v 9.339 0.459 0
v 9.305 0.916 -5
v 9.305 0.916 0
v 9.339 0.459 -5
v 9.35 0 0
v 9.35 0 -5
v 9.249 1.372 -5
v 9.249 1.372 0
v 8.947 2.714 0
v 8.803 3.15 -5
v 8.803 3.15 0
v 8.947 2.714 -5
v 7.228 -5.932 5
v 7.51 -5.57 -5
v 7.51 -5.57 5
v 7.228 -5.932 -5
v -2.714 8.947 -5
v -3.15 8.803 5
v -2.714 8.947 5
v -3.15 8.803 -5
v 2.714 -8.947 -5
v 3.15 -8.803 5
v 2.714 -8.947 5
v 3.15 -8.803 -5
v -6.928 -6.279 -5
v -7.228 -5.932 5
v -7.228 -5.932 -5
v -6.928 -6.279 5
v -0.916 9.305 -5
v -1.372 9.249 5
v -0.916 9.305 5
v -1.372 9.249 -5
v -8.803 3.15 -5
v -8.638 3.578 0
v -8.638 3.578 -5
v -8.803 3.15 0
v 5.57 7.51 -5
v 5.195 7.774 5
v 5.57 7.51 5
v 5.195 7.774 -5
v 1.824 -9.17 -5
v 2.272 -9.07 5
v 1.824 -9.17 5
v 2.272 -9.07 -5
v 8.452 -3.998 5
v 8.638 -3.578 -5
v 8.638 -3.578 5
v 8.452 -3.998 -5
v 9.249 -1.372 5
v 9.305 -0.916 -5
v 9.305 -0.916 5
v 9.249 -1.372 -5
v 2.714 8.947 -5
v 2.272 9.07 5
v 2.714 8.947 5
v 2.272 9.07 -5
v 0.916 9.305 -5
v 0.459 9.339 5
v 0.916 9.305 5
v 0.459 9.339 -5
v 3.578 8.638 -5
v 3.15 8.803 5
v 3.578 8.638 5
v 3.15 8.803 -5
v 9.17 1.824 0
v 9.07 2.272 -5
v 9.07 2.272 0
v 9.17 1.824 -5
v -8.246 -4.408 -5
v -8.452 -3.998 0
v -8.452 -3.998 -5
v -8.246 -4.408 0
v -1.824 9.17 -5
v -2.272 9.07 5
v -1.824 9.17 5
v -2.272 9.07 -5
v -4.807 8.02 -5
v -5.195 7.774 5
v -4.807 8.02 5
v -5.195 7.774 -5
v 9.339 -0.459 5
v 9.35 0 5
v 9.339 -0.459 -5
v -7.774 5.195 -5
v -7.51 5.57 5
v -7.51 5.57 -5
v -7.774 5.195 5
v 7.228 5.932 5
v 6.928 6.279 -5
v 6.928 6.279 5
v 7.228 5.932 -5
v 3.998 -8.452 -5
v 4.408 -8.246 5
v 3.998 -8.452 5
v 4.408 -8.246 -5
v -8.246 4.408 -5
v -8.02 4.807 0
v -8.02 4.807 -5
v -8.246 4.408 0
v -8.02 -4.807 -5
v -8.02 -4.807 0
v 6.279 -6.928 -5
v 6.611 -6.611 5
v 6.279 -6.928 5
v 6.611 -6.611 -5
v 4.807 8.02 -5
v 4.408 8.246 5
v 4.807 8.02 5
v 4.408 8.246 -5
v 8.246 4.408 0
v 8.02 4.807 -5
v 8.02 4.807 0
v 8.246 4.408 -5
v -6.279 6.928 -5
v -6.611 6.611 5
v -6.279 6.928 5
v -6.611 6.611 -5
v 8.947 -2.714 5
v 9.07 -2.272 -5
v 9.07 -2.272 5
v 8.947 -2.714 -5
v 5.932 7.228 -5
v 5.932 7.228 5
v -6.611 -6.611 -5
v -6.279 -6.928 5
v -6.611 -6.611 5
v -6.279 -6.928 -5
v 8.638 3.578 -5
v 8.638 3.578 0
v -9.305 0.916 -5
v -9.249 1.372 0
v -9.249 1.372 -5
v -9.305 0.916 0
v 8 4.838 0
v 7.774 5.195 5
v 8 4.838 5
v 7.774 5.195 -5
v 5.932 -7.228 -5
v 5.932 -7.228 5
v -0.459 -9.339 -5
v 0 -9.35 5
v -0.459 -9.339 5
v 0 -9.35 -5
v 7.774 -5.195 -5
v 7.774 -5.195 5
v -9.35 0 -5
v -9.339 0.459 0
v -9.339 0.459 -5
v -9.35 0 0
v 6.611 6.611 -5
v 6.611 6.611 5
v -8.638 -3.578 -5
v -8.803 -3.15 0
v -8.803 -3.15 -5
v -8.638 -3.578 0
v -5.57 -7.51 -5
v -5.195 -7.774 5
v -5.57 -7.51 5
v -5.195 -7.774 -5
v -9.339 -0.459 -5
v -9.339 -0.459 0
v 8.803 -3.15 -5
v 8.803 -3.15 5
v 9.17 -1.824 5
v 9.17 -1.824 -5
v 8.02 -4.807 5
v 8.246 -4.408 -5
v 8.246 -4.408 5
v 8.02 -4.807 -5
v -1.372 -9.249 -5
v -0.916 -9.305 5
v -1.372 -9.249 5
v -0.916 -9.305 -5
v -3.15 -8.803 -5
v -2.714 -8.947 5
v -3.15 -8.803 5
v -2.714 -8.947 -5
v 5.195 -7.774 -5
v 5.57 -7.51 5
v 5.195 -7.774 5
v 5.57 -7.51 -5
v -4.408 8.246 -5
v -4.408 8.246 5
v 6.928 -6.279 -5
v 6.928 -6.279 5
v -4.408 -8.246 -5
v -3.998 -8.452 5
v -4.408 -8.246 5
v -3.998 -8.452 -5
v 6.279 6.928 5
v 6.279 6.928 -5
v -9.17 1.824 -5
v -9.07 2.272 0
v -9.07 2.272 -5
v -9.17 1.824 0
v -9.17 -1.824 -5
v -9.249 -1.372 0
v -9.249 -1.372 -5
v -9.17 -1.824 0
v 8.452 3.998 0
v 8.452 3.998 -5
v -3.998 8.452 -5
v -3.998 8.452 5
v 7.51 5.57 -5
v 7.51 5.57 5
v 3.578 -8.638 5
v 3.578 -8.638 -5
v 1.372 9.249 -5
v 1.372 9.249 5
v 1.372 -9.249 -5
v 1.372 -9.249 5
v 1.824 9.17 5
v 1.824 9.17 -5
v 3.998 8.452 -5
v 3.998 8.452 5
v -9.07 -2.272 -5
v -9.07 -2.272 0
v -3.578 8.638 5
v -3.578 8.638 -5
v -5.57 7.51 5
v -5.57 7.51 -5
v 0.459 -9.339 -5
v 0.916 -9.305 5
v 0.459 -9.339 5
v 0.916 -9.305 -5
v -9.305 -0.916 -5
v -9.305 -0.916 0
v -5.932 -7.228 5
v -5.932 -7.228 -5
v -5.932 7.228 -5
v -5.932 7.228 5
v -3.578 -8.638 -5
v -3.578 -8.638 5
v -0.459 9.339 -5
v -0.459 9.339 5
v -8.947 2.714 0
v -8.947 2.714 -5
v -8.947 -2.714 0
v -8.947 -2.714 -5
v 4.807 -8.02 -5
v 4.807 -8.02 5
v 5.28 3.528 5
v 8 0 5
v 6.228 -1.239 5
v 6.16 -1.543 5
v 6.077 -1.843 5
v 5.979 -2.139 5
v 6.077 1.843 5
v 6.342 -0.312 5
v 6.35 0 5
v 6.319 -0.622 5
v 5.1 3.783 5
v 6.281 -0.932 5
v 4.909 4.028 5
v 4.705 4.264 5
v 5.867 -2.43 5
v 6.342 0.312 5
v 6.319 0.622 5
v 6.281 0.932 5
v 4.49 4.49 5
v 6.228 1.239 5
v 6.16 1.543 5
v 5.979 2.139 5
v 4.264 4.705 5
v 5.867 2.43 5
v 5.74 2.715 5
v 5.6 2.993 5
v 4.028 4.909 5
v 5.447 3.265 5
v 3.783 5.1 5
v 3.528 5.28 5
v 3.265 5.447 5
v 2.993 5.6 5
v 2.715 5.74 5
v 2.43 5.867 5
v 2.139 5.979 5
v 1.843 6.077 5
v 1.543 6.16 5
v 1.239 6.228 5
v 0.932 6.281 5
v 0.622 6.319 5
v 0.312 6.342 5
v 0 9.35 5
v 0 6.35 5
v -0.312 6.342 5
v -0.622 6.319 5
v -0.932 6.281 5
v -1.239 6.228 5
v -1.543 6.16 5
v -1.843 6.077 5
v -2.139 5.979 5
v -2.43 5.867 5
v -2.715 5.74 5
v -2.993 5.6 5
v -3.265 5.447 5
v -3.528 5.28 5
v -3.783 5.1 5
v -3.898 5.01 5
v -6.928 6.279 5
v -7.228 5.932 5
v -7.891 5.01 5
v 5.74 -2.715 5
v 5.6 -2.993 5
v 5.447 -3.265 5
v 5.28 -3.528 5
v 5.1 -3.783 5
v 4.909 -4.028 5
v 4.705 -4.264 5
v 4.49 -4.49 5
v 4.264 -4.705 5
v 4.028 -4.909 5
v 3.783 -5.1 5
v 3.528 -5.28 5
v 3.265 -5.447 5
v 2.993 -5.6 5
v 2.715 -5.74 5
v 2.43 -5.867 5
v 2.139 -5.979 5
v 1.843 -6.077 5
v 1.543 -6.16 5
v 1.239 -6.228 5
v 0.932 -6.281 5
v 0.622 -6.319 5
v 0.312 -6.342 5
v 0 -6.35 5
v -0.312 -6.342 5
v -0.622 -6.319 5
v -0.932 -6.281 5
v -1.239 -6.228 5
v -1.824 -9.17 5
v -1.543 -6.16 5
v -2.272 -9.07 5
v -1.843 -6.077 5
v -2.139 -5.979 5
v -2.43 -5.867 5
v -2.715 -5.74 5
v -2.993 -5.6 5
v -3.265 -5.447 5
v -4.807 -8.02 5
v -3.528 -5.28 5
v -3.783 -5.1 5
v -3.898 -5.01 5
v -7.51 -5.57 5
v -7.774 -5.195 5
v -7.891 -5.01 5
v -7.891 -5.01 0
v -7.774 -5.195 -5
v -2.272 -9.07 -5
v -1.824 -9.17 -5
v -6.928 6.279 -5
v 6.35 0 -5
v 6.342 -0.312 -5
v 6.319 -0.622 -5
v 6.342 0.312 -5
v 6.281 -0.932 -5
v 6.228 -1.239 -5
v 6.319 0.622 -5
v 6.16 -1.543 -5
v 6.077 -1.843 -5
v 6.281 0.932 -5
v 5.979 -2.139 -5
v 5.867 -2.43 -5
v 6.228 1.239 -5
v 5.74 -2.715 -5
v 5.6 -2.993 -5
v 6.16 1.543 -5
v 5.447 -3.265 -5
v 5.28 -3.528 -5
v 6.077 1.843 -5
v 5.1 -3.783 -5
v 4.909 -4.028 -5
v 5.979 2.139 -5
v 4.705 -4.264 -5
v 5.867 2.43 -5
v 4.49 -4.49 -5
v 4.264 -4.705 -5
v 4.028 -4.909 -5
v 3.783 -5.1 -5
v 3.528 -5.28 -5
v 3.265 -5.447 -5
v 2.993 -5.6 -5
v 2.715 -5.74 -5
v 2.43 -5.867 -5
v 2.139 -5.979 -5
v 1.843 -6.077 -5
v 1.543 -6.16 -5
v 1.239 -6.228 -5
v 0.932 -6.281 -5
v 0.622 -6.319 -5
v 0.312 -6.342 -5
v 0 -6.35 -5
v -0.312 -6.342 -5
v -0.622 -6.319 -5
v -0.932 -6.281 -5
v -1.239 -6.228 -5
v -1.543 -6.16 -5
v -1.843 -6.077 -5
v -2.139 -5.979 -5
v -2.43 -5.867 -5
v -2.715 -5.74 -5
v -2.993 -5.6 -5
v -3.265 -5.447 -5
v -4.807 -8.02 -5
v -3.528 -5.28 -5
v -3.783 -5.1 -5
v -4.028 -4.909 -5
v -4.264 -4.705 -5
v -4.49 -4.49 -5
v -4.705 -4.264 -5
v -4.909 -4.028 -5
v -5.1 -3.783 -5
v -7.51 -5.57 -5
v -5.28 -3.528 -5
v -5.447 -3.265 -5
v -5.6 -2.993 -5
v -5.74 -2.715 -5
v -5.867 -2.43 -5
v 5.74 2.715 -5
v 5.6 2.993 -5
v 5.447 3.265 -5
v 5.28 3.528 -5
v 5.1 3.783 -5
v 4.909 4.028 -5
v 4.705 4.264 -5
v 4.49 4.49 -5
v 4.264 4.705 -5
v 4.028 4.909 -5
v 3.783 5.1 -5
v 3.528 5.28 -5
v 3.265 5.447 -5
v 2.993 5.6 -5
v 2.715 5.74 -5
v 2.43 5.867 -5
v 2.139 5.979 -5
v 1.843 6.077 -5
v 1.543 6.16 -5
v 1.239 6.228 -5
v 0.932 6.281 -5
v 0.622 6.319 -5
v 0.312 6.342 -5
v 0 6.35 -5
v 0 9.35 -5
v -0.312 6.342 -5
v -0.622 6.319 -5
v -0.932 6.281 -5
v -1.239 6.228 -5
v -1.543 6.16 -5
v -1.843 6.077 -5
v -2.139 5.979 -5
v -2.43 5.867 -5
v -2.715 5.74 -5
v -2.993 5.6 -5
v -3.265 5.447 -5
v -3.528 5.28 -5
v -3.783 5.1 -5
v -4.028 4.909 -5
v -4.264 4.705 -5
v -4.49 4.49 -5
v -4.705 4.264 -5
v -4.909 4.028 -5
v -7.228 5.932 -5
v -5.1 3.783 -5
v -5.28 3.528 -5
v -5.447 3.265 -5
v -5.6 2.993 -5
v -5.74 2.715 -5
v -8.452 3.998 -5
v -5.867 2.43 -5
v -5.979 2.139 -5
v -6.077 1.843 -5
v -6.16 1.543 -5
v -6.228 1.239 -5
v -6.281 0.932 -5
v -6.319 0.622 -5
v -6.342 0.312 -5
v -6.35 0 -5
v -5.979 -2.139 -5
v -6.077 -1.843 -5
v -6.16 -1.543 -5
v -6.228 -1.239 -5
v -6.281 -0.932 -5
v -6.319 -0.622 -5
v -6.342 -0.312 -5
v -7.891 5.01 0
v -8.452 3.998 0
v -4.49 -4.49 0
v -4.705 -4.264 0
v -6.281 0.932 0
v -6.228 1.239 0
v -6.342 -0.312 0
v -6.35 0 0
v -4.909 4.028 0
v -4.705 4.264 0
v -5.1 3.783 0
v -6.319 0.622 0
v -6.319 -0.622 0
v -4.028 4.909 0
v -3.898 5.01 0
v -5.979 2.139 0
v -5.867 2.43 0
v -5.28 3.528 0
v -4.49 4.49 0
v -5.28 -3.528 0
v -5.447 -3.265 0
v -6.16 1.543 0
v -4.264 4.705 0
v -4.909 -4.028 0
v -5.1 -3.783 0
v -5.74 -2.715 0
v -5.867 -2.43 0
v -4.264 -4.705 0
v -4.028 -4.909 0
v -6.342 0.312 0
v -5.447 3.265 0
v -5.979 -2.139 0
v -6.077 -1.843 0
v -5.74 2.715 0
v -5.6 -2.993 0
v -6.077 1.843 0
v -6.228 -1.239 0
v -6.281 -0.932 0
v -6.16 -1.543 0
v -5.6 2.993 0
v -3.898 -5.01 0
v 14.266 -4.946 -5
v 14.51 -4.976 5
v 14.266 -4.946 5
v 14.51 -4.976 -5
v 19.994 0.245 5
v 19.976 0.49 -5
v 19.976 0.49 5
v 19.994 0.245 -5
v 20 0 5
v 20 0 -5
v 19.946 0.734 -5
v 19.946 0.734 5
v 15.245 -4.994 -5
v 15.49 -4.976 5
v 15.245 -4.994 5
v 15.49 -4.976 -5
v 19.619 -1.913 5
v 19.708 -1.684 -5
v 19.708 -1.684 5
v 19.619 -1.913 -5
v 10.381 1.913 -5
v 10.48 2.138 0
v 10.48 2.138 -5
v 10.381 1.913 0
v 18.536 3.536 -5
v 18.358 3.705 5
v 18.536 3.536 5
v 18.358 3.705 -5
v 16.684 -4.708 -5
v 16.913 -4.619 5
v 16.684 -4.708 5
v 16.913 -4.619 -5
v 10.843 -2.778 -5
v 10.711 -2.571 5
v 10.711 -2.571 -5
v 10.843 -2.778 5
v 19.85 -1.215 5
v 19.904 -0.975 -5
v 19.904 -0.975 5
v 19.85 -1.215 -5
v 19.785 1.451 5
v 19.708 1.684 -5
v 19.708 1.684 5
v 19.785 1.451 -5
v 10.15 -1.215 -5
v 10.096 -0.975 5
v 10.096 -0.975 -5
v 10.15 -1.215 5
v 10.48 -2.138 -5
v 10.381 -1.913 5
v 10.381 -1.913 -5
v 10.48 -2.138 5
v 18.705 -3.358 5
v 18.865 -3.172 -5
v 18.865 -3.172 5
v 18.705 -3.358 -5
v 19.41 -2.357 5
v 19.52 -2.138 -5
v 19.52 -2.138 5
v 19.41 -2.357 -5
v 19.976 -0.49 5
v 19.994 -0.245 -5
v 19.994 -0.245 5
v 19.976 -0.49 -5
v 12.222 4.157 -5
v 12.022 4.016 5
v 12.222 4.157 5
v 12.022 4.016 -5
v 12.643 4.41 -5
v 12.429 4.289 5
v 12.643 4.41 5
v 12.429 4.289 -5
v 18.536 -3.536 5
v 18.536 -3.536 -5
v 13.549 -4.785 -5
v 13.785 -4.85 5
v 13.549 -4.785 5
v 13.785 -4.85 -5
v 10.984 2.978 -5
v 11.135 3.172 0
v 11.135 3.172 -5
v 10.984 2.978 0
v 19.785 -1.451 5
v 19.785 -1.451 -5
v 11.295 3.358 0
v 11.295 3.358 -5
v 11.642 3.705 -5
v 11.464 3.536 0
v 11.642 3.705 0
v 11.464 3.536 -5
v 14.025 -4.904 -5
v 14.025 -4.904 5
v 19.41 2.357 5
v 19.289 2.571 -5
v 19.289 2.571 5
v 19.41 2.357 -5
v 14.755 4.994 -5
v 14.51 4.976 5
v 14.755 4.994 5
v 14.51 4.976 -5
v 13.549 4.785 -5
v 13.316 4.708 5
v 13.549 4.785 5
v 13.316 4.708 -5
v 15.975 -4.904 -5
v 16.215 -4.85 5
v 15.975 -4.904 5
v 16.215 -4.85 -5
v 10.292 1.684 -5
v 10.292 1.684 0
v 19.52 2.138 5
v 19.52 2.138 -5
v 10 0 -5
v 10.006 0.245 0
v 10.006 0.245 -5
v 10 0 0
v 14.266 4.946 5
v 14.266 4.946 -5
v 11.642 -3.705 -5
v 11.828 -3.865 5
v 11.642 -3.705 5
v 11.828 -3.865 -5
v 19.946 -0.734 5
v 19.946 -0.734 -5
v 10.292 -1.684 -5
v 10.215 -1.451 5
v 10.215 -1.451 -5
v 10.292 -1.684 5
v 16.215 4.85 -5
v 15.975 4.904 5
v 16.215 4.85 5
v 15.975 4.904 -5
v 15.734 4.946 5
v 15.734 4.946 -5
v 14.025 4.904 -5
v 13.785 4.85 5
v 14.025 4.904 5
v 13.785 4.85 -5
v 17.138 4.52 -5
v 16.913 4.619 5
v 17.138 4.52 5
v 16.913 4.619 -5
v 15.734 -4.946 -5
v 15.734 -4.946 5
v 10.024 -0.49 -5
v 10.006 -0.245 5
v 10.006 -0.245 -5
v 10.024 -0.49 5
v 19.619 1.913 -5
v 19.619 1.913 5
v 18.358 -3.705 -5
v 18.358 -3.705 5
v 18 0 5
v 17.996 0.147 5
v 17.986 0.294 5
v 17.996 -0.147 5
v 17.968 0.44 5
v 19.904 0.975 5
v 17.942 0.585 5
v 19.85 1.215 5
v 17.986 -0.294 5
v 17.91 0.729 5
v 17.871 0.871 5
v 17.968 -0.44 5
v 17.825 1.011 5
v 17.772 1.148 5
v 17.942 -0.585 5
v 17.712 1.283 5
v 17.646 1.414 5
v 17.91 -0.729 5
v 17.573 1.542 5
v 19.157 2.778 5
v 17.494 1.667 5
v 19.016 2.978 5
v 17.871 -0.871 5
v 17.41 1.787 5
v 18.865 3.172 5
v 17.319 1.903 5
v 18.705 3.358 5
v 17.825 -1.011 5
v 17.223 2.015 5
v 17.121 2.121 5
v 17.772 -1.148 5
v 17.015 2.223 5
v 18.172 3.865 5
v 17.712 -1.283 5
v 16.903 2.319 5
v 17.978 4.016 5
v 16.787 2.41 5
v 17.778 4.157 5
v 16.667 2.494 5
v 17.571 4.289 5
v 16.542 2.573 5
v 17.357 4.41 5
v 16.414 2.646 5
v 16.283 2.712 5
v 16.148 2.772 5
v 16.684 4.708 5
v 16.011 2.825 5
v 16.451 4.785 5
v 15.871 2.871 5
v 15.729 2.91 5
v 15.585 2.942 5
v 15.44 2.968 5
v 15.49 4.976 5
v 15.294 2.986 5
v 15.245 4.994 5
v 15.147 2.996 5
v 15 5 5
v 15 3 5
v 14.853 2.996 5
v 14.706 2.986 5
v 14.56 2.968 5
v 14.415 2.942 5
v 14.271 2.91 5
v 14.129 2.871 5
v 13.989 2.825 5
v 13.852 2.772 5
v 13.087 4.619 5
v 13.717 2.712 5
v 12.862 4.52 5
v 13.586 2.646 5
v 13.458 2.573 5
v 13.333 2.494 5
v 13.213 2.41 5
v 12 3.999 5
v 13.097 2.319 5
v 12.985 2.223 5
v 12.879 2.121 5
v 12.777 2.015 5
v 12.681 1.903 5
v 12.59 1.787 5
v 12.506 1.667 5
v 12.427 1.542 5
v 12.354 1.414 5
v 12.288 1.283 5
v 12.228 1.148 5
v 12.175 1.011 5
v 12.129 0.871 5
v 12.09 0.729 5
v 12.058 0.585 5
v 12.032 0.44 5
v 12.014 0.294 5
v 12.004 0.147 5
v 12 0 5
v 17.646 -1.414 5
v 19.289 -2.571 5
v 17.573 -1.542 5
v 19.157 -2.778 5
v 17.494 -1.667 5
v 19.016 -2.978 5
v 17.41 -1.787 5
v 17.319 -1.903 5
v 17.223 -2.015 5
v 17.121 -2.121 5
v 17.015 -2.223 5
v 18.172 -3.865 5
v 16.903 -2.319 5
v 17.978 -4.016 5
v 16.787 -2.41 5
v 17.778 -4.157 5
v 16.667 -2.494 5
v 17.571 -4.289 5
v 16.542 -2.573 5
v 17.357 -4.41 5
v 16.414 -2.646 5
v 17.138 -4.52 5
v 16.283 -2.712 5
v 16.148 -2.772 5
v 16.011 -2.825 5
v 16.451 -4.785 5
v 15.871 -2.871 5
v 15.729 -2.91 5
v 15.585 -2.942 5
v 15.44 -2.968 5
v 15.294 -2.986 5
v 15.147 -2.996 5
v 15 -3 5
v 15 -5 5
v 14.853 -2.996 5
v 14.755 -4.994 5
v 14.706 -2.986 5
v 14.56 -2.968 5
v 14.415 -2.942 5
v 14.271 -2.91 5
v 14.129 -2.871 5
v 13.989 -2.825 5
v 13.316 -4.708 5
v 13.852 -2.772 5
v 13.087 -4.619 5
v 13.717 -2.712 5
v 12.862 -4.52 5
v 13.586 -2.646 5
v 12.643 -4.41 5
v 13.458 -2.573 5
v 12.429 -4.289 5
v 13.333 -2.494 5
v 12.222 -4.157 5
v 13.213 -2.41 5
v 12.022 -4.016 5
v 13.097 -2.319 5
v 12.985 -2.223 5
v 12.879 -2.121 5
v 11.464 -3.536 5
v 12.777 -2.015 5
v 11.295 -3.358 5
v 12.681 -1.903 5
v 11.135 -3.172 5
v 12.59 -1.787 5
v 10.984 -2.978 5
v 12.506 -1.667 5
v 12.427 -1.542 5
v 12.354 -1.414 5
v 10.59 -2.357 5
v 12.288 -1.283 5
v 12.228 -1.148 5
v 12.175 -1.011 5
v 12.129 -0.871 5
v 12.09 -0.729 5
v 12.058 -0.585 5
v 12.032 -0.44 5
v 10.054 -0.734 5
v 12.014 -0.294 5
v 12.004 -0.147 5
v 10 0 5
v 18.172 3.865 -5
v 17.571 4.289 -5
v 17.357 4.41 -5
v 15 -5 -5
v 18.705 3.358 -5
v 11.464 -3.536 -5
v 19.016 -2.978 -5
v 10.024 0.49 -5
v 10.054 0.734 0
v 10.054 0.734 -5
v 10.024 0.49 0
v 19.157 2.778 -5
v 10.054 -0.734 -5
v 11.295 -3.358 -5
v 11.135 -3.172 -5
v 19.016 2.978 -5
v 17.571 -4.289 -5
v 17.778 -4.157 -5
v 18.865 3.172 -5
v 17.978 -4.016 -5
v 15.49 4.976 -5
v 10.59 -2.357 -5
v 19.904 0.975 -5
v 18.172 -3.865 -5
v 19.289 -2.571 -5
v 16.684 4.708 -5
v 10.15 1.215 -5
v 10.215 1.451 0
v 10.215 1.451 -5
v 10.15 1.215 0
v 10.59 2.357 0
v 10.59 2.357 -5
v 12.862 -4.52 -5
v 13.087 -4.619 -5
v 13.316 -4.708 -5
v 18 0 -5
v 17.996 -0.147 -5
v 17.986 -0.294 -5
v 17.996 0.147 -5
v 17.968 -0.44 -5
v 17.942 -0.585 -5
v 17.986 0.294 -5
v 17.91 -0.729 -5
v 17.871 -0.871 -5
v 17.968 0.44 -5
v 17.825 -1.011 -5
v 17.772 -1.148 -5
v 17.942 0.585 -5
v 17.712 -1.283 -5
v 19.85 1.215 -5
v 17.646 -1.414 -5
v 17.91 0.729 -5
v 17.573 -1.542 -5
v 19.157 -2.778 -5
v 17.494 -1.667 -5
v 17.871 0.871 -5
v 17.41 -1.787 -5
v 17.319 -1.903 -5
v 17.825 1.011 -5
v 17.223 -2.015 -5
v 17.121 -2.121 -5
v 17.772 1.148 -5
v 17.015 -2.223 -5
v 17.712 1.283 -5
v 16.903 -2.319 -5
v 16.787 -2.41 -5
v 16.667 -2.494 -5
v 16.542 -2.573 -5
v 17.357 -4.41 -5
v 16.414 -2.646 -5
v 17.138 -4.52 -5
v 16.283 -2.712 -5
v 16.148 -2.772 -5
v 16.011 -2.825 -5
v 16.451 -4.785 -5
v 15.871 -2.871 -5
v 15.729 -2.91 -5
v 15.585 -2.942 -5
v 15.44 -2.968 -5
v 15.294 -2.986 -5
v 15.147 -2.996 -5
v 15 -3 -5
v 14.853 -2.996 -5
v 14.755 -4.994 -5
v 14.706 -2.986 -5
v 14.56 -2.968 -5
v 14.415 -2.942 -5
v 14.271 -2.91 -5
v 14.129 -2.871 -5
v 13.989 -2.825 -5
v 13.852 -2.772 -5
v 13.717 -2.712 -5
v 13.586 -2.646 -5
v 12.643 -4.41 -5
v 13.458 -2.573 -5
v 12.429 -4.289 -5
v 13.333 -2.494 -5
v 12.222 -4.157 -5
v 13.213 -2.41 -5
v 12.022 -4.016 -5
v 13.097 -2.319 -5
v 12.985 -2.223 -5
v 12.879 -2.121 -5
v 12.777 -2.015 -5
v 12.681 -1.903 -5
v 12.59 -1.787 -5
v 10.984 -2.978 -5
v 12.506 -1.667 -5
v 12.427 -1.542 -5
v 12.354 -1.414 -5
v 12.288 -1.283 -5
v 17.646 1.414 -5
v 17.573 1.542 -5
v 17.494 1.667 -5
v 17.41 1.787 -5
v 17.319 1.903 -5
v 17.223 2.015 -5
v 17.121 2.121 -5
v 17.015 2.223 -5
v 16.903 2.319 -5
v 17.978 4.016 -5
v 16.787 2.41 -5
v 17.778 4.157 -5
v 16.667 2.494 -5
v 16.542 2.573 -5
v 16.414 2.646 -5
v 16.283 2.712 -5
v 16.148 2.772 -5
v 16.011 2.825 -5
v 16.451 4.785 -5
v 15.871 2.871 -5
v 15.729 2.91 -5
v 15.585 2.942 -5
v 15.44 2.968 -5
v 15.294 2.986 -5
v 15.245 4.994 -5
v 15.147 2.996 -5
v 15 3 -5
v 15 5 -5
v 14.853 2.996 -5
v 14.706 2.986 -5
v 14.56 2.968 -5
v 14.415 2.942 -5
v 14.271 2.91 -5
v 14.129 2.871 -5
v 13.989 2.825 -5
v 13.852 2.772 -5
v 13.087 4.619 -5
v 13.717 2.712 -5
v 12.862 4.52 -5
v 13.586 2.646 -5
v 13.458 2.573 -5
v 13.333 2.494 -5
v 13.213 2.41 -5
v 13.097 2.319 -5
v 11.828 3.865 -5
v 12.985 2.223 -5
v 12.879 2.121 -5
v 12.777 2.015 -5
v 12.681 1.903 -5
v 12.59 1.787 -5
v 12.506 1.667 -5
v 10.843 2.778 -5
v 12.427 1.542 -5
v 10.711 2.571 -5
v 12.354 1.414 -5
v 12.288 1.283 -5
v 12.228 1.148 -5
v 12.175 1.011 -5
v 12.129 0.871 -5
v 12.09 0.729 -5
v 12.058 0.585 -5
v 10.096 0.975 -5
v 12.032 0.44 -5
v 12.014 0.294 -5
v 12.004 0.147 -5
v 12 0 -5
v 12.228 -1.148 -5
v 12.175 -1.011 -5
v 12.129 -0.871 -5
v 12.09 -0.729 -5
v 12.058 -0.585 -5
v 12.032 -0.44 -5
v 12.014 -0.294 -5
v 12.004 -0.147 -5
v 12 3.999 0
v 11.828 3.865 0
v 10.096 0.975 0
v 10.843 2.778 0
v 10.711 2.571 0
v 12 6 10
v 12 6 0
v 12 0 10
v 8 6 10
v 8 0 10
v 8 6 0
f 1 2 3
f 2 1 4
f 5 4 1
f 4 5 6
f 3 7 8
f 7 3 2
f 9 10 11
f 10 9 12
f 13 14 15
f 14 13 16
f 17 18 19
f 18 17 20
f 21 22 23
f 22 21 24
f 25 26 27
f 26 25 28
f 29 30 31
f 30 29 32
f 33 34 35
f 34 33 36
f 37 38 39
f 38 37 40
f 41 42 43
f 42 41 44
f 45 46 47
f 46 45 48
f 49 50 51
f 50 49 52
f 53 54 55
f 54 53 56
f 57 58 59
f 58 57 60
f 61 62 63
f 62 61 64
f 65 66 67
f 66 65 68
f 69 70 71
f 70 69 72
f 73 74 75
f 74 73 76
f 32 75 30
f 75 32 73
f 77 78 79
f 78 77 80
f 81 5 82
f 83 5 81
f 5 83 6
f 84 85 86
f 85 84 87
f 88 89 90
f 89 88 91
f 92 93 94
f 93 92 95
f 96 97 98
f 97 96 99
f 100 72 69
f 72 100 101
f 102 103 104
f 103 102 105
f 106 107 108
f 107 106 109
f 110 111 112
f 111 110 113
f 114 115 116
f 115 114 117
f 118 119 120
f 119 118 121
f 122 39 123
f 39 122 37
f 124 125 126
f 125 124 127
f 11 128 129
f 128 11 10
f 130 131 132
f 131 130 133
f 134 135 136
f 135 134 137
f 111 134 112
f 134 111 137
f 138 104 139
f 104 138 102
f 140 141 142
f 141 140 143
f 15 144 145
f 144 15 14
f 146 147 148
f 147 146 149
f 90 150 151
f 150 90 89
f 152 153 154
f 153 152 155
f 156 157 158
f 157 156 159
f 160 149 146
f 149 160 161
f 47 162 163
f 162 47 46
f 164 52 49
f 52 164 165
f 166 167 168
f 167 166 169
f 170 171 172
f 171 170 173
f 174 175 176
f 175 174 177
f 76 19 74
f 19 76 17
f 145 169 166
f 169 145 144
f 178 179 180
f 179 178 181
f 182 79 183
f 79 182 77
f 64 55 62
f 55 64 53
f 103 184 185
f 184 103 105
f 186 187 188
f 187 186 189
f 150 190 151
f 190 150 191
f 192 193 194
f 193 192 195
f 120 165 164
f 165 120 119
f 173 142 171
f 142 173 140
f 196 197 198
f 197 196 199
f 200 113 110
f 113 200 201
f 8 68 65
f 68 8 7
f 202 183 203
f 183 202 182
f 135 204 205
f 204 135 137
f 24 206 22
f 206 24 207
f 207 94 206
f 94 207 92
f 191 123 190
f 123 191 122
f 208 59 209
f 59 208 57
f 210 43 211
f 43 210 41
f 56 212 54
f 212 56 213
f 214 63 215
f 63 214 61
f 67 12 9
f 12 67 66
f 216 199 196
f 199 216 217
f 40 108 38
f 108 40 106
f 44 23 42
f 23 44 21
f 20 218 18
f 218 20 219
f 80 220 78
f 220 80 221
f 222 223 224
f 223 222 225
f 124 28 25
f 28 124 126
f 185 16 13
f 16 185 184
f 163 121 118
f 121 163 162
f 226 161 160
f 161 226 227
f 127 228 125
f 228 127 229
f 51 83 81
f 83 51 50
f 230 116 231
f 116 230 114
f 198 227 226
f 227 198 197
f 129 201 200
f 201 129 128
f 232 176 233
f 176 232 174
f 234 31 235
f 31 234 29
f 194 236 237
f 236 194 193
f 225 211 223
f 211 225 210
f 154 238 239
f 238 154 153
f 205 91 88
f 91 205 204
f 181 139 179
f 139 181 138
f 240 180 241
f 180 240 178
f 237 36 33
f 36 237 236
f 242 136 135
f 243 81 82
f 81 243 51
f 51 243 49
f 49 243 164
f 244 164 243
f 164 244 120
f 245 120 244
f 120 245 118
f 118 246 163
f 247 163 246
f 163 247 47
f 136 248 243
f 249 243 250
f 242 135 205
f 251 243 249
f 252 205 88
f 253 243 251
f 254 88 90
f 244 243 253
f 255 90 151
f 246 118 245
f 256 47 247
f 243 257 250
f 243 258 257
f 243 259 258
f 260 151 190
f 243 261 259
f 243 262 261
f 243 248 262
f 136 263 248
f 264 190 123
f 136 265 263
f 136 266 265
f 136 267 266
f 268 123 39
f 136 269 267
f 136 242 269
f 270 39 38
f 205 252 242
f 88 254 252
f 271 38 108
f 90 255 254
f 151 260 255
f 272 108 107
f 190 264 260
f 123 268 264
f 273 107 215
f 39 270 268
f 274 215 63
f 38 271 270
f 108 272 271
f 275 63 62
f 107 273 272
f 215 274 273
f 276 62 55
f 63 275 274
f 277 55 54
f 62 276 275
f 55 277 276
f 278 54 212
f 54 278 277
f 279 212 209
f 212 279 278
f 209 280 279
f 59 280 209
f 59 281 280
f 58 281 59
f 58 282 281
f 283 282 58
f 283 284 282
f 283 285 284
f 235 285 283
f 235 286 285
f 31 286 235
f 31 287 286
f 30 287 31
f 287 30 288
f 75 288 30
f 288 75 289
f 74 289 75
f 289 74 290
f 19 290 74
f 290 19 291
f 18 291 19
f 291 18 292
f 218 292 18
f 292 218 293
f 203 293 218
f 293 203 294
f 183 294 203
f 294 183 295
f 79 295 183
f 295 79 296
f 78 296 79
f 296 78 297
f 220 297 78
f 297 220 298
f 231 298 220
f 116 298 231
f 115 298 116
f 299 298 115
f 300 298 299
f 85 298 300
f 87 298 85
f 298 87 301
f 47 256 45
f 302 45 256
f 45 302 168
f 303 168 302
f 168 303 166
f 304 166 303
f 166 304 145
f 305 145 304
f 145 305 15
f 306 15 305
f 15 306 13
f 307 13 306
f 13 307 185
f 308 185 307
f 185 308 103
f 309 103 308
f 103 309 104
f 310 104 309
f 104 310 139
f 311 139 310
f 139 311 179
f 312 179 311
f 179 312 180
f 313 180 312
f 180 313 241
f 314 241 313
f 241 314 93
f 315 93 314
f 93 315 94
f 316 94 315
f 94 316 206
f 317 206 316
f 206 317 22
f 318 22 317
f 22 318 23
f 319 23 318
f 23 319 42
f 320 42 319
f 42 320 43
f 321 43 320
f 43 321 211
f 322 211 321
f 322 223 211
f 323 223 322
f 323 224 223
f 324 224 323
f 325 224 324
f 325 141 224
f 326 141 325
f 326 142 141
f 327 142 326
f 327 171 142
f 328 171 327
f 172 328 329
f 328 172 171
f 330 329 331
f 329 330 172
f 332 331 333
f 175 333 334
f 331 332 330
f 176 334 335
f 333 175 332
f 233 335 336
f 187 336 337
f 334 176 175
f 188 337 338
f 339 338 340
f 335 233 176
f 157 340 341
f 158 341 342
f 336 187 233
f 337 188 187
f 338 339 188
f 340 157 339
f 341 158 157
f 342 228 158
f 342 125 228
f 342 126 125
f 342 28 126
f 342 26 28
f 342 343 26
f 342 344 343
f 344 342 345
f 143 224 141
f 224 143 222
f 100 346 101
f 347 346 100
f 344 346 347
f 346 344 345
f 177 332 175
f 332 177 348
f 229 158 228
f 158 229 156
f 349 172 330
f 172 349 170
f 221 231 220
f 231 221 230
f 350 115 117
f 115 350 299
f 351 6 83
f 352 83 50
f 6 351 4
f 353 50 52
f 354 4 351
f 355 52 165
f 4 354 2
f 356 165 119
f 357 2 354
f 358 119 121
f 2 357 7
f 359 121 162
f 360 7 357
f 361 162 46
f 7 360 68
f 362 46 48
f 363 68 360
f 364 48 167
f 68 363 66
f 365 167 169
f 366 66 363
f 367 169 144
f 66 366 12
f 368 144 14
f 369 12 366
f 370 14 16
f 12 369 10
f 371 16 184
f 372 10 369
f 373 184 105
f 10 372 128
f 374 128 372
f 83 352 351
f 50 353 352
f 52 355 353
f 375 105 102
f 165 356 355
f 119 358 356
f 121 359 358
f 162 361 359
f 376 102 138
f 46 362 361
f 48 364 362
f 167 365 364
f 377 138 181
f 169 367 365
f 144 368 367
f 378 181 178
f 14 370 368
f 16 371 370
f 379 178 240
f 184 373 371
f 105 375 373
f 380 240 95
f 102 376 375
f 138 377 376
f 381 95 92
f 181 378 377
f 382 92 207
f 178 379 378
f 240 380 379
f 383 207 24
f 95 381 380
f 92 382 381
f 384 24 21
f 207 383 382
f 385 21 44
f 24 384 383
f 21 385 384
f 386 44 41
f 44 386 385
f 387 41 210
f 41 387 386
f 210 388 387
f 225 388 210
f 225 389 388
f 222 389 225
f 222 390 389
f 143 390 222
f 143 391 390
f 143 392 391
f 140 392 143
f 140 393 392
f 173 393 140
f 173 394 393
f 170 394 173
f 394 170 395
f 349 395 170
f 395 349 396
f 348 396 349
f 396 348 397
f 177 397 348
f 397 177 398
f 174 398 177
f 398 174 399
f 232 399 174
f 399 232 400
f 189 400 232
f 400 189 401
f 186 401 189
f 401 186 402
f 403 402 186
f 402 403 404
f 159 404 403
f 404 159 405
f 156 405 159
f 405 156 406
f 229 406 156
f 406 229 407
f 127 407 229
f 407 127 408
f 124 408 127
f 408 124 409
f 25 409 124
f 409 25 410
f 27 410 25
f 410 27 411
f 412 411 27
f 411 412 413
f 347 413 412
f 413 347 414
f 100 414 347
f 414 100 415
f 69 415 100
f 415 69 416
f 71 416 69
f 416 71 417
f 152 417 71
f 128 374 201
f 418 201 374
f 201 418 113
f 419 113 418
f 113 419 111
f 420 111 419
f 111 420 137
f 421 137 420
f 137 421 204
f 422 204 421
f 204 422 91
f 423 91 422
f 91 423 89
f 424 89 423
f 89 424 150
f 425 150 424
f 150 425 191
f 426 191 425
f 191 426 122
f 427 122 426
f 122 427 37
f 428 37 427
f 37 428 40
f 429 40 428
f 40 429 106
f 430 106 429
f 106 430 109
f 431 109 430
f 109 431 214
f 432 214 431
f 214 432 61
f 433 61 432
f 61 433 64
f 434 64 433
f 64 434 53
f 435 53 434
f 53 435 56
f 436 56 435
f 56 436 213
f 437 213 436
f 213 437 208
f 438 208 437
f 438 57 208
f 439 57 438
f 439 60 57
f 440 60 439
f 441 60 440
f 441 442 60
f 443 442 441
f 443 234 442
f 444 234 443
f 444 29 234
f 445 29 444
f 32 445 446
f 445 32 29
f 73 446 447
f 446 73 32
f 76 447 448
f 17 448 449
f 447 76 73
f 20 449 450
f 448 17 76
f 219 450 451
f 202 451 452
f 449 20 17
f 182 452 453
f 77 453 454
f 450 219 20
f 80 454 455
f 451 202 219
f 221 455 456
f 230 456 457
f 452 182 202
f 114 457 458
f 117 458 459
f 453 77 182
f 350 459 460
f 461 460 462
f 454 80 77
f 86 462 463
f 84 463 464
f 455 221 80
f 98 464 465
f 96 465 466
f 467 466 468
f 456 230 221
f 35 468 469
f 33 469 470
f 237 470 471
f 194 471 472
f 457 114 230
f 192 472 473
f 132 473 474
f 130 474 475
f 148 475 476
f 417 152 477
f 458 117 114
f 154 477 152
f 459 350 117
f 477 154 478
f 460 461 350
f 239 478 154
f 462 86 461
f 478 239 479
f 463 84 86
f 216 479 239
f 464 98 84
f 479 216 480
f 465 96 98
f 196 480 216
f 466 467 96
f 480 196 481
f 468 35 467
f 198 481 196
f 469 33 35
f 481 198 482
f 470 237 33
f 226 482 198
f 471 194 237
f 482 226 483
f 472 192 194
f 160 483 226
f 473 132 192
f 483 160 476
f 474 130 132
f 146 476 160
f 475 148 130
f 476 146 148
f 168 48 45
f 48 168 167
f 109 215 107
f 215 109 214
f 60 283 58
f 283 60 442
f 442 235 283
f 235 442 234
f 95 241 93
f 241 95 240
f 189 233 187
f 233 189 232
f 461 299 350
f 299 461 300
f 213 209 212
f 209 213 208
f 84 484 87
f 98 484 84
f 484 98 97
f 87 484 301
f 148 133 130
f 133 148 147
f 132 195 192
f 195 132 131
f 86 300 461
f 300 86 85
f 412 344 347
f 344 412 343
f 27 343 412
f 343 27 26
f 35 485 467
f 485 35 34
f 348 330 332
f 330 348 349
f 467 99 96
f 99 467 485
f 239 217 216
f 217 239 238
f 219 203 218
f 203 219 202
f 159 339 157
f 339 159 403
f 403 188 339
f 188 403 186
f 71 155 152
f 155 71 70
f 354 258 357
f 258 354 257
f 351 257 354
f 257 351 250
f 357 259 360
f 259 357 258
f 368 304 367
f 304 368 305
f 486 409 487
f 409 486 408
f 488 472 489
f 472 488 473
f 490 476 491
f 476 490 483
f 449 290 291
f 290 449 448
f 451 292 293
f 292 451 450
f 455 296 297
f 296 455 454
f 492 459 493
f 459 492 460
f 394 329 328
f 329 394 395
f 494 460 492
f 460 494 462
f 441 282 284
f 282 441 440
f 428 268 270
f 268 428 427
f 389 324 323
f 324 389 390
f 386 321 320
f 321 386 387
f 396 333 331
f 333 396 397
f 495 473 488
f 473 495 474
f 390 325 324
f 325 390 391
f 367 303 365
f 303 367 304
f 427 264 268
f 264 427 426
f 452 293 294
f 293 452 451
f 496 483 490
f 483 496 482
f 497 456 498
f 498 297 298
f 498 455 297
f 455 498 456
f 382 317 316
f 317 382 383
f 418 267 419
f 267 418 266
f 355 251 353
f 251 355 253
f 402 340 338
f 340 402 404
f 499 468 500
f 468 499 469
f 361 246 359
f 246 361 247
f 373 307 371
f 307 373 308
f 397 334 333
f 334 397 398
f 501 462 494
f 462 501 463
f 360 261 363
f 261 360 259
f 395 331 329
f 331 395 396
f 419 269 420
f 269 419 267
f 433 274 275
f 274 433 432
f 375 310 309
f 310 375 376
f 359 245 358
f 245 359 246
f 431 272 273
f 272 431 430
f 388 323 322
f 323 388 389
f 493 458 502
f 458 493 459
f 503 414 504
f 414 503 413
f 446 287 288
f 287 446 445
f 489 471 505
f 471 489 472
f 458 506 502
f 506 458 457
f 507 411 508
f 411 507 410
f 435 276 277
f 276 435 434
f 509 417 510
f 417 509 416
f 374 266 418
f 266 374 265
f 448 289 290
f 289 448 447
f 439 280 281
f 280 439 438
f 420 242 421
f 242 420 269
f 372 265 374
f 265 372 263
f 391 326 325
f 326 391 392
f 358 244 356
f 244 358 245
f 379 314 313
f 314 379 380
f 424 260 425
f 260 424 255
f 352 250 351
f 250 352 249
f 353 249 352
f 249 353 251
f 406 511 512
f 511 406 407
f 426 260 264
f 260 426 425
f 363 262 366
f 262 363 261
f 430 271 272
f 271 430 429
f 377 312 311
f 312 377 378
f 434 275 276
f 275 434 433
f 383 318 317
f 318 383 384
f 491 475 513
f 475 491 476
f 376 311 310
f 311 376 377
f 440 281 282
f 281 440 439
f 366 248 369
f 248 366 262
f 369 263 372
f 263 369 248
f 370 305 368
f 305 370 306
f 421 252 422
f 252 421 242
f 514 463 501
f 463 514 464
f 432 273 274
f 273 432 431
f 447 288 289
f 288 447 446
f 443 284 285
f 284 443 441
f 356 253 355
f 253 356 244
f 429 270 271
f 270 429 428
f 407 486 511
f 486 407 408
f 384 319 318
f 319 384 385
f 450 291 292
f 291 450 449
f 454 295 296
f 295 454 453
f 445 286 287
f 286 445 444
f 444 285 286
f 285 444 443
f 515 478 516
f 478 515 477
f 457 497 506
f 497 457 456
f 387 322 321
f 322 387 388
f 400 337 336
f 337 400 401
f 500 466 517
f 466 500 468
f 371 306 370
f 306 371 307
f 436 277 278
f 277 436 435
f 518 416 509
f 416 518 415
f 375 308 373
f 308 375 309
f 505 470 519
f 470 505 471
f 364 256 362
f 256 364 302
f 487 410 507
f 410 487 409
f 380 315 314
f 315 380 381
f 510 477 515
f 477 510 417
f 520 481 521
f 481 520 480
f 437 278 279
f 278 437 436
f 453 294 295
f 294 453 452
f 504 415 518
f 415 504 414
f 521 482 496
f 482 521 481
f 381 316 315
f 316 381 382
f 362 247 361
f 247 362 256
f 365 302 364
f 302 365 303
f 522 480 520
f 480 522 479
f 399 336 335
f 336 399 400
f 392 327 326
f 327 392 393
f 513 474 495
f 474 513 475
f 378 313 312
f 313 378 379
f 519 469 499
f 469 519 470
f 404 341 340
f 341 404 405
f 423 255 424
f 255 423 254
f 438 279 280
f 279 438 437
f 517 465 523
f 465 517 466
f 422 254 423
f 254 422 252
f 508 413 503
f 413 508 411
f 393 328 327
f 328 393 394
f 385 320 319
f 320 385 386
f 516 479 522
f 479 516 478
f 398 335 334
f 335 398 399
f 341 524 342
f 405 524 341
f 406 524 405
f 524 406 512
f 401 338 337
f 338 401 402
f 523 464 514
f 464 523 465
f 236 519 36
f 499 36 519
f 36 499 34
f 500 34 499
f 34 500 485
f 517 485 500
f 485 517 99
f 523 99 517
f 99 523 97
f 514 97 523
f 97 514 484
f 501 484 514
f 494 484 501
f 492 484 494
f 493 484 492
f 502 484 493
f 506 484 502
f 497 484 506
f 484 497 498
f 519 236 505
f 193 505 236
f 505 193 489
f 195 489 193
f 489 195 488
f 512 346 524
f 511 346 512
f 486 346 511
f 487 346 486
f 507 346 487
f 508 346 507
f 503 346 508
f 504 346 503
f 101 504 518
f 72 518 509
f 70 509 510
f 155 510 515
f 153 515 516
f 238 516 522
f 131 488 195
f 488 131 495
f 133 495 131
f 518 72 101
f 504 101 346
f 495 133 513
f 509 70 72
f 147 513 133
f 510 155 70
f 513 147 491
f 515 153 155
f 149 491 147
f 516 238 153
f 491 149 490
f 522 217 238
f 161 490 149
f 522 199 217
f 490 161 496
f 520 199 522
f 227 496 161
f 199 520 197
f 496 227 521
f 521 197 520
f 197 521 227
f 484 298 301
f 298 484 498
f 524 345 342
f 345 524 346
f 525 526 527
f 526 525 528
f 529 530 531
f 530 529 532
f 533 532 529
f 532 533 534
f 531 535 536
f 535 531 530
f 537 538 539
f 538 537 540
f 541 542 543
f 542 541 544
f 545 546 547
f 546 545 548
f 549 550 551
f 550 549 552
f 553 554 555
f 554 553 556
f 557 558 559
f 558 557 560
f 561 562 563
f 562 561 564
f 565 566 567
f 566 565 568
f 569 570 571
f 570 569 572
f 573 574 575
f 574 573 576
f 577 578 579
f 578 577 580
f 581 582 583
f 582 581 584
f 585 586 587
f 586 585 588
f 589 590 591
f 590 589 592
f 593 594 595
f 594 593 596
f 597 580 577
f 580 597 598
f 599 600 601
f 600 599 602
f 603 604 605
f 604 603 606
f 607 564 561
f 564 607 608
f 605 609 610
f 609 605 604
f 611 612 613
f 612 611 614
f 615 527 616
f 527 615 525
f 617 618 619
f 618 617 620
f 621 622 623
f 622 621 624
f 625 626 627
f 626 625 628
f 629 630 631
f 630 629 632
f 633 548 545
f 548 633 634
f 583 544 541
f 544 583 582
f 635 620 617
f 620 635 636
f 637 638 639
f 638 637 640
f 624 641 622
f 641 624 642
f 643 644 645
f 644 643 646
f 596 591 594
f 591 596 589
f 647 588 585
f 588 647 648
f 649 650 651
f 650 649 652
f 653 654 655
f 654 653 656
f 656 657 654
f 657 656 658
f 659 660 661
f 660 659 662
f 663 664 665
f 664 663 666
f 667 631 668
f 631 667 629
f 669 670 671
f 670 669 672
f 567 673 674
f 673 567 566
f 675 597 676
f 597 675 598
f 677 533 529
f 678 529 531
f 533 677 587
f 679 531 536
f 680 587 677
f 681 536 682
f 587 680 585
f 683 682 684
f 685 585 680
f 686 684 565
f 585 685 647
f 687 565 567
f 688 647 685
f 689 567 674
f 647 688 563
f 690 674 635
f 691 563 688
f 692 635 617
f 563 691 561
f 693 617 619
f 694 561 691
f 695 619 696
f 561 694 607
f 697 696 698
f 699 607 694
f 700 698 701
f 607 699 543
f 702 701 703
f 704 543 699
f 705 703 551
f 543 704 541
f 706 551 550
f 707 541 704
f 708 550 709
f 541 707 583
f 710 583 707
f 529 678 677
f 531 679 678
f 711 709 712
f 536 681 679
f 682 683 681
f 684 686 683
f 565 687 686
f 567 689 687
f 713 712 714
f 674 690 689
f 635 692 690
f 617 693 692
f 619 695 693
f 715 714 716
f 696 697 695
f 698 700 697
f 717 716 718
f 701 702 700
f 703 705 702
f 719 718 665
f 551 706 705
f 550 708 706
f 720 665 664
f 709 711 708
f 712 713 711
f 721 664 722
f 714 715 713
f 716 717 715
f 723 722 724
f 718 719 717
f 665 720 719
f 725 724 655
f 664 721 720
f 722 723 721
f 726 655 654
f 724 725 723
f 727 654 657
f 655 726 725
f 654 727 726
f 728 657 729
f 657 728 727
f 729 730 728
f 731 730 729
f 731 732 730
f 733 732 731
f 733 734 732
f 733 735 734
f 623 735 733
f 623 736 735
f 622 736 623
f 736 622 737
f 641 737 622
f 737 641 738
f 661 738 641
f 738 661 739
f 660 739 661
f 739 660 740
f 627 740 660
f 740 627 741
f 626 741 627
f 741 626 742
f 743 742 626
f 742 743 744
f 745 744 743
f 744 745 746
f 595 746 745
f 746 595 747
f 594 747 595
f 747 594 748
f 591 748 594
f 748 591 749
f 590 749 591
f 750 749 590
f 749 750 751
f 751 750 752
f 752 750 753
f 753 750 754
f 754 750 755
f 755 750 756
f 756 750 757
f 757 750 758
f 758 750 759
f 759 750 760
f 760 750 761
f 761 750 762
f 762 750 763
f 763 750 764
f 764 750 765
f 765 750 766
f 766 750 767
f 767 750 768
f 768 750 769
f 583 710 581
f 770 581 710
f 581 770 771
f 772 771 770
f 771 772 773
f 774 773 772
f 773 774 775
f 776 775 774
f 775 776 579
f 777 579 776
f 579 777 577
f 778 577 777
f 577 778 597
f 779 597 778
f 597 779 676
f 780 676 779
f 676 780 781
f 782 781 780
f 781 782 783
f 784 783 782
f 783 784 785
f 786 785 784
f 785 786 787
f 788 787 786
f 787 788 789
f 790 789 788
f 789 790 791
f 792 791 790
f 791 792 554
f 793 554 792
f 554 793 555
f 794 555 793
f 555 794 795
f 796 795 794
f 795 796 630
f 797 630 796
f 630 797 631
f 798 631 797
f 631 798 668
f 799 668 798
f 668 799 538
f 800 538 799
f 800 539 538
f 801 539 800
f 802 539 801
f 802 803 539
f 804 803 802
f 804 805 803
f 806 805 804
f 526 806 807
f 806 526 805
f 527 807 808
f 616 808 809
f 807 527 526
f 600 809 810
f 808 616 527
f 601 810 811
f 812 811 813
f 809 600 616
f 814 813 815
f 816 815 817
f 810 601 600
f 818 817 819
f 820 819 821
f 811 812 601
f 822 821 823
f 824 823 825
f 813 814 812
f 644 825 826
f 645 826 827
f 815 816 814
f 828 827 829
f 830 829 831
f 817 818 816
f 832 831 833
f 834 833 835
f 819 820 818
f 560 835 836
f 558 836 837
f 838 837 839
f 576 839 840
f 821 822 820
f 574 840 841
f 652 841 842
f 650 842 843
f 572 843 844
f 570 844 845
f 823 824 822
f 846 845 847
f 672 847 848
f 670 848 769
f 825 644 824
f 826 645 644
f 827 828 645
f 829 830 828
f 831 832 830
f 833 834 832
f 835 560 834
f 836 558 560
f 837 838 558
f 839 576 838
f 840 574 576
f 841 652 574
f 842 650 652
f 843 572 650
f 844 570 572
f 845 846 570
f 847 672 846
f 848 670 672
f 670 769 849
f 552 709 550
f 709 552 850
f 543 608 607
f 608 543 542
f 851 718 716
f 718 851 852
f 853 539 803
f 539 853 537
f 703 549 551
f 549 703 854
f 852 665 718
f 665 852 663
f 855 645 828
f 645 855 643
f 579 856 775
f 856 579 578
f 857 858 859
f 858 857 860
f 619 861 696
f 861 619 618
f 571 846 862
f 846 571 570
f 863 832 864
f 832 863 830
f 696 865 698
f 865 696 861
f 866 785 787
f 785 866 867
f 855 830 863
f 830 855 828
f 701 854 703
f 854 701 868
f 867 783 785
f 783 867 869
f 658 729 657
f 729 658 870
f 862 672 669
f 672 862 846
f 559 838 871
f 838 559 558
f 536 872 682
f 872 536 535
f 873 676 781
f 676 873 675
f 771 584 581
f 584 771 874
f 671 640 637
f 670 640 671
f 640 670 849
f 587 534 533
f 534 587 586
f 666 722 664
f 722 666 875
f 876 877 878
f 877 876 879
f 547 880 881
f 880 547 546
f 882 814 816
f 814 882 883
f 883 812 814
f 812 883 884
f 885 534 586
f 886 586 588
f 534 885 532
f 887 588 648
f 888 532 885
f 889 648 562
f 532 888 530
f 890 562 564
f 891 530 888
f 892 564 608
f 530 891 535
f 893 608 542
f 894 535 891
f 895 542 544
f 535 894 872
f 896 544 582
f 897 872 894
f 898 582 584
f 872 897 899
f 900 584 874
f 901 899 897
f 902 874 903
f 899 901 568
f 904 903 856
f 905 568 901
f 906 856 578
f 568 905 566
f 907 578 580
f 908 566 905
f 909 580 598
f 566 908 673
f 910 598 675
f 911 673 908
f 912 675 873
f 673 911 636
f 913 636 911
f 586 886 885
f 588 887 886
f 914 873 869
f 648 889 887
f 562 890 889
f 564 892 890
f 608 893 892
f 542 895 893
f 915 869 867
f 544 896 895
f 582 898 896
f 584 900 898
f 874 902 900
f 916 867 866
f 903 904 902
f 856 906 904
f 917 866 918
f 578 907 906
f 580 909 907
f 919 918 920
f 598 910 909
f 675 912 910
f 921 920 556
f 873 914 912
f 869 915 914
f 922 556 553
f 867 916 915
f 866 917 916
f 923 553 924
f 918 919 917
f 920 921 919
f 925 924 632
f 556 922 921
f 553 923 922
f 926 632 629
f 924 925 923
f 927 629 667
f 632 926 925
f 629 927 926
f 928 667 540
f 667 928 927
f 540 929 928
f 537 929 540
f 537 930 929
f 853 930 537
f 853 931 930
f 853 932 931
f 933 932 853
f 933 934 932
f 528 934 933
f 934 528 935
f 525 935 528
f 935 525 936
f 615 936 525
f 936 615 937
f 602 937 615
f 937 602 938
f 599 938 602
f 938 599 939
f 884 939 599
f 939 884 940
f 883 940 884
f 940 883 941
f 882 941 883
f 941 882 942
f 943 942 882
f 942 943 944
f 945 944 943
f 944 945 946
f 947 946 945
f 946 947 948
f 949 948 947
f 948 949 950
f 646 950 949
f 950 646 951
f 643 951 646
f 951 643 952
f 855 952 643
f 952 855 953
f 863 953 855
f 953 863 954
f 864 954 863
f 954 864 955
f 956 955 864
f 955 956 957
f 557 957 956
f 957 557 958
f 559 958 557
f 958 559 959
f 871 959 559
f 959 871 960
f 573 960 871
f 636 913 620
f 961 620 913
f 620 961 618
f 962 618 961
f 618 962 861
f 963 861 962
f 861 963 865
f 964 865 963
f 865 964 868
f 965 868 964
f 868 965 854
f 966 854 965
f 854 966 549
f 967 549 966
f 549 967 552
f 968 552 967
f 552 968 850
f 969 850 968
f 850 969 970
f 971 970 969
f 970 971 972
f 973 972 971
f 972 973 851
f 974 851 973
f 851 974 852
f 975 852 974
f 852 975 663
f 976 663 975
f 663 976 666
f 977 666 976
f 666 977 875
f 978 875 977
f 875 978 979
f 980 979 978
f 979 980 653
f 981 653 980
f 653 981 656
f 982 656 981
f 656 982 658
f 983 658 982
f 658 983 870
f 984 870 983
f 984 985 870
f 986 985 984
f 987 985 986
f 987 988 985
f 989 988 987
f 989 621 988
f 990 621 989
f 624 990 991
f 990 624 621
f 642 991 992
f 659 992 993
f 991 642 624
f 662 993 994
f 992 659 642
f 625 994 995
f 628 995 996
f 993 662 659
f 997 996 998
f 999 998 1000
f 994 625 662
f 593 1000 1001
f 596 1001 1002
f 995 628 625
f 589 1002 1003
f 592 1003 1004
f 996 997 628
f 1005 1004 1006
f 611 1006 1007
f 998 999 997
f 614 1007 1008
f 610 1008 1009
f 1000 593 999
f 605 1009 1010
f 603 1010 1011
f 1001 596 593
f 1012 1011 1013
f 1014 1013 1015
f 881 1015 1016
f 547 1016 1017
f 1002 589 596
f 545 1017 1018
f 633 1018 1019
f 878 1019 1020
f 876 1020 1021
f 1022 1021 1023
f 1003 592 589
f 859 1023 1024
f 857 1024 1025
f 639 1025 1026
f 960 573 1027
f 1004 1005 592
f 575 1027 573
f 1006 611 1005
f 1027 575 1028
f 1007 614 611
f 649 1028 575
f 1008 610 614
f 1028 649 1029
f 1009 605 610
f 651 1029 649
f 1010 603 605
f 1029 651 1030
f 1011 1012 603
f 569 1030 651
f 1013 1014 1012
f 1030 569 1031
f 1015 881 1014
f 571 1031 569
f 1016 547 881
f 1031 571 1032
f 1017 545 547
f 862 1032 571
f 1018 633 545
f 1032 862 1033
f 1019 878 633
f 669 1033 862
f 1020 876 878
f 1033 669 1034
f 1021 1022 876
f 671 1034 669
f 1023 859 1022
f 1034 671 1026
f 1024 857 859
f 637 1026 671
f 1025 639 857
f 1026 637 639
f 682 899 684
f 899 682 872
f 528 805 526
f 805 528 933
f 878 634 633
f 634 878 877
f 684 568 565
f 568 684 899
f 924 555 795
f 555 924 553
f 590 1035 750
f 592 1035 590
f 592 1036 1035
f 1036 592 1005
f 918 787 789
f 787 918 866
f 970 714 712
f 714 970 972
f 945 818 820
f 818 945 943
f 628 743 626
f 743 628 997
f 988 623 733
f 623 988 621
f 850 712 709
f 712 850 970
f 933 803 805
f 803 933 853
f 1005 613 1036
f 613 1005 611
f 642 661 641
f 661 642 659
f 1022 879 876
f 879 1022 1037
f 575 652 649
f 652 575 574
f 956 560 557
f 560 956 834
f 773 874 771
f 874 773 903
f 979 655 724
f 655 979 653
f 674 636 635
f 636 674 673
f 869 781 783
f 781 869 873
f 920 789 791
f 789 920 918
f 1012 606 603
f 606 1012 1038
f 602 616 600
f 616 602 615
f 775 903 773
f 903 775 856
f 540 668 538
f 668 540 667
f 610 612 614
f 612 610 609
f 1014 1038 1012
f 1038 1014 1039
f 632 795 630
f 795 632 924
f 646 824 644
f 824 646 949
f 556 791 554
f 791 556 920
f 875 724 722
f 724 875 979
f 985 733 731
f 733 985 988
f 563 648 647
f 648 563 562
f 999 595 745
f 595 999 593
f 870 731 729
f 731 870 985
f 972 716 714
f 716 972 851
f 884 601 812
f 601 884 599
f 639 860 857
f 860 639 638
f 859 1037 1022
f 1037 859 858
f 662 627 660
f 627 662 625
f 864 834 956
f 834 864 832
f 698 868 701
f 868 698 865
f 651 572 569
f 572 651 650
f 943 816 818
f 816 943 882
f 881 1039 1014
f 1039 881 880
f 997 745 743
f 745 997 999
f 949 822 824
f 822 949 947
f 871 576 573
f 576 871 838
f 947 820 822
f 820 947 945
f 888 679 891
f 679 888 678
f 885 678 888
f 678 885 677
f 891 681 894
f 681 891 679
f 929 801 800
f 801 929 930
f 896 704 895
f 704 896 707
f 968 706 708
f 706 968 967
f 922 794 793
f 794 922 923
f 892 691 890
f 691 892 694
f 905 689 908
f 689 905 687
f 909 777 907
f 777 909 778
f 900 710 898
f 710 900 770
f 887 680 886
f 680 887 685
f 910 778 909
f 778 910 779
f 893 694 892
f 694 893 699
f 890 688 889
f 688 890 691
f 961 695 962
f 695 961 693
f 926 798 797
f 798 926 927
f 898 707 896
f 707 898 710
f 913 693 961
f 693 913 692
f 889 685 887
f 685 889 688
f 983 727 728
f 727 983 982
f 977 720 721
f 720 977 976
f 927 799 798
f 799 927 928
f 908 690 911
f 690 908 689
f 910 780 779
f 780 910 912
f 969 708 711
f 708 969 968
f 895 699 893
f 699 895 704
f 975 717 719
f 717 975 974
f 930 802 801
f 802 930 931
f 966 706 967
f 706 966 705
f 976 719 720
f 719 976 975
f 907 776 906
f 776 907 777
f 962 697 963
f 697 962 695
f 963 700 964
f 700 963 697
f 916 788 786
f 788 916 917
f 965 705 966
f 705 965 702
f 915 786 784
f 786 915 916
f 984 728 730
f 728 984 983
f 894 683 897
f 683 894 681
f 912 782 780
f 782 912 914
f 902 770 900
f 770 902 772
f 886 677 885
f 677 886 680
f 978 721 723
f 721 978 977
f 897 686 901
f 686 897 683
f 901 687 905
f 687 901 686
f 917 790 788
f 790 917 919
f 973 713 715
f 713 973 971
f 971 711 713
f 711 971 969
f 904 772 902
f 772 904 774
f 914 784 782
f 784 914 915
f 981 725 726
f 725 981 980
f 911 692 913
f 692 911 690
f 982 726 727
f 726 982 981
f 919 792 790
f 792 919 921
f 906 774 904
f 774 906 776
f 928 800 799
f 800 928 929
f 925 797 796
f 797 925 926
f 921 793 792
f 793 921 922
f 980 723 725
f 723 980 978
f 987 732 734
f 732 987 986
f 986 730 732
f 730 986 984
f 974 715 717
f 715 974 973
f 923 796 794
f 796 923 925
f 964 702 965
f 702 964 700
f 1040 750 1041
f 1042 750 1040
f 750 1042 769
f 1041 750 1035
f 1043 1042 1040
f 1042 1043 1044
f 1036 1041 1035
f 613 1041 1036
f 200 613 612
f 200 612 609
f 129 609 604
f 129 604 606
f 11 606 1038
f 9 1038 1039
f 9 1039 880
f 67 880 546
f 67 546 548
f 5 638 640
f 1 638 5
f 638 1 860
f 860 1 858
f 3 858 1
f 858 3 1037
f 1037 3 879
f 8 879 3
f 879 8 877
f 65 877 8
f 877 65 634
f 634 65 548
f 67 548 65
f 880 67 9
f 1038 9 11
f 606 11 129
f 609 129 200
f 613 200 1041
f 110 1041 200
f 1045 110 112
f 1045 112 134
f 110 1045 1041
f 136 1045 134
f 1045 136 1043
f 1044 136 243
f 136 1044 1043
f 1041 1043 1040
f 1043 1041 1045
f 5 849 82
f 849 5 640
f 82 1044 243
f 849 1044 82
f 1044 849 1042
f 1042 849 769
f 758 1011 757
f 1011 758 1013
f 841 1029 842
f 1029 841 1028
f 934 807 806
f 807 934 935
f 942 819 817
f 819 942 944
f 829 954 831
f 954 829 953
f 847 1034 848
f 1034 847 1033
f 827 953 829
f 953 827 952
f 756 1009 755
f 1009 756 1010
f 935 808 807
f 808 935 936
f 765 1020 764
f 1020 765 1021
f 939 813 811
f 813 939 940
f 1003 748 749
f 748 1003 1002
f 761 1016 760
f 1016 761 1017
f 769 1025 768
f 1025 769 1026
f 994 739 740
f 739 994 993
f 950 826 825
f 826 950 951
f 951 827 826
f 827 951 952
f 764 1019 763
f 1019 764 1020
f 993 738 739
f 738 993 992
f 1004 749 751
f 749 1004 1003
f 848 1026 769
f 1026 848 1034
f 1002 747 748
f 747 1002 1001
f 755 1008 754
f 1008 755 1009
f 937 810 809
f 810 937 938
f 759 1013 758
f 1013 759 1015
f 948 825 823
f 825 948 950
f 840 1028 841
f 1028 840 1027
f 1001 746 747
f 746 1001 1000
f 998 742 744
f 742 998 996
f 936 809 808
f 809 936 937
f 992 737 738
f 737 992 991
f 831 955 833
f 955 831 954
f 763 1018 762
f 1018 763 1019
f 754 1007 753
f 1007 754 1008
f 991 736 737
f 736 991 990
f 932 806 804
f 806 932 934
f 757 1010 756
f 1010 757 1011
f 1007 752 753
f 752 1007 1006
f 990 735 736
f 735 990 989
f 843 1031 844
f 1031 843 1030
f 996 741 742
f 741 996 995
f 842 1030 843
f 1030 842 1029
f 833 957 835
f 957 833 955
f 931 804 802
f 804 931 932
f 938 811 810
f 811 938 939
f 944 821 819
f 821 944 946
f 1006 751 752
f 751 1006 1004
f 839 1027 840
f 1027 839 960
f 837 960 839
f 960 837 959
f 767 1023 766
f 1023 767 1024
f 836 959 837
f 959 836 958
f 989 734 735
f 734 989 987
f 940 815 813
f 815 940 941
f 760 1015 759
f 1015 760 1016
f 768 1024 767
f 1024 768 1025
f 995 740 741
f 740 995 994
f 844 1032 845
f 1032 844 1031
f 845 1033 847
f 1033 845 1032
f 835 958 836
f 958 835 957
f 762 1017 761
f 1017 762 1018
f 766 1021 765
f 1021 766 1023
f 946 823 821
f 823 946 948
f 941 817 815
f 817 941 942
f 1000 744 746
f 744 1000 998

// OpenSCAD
// Snap-on Clip for Lab Stand Rod and Tubing
// Orientation: Flat on XY plane, building upward (+Z)
// Units: Millimetres

// --- Dimensions ---
// Rod Stand Dimensions
$rod_diameter = 12.7;
$rod_wall_thickness = 3;
$rod_outer_diameter = $rod_diameter + 2 * $rod_wall_thickness; // 18.7
$rod_ring_height = 10;

// Tubing Dimensions
$tubing_diameter = 6;
$tubing_wall_thickness = 2;
$tubing_outer_diameter = $tubing_diameter + 2 * $tubing_wall_thickness; // 8
$tubing_ring_height = 10;

// Positioning
$rod_center_x = 0;
$rod_center_y = 0;
$tubing_center_x = 15;
$tubing_center_y = 0;

// Bridge Dimensions
$bridge_width_x = 4; // From x=8 to x=12
$bridge_width_y = 6;
$bridge_height = 10;

// Cutout Dimensions
// Rod cutout: 10mm wide, centered at y=0, on -X side
$rod_cutout_width = 10;
$rod_cutout_half_y = $rod_cutout_width / 2; // 5

// Tubing cutout: 4.5mm wide, centered at y=0, on +X side
$tubing_cutout_width = 4.5;
$tubing_cutout_half_y = $tubing_cutout_width / 2; // 2.25

// --- Configuration ---
$fn = 128; // High resolution for smooth curves and accurate hole sizes

// --- Main Body Construction ---
difference() {
    // 1. Create the solid base profile (Ring + Bridge)
    union() {
        // Rod Ring
        translate([0, 0, 0]) {
            difference() {
                // Outer Cylinder
                cylinder(h = $rod_ring_height, d = $rod_outer_diameter, center = true);
                
                // Inner Hole (Rod)
                cylinder(h = $rod_ring_height, d = $rod_diameter, center = true);
                
                // Cutout on -X side
                // We subtract a rectangular prism that extends slightly past the ring face
                translate([-($rod_outer_diameter/2) - 0.5, -($rod_cutout_half_y) - 0.01, 0]) 
                    cube([($rod_outer_diameter/2) + 0.5, $rod_cutout_width + 0.02, $rod_ring_height + 0.01]);
            }
        }
        
        // Tubing Ring
        translate([$tubing_center_x, $tubing_center_y, 0]) {
            difference() {
                // Outer Cylinder
                cylinder(h = $tubing_ring_height, d = $tubing_outer_diameter, center = true);
                
                // Inner Hole (Tubing)
                cylinder(h = $tubing_ring_height, d = $tubing_diameter, center = true);
                
                // Cutout on +X side
                // We subtract a rectangular prism that extends slightly past the ring face
                translate([$tubing_outer_diameter/2 + 0.5, -($tubing_cutout_half_y) - 0.01, 0]) 
                    cube([$tubing_outer_diameter/2 + 0.5, $tubing_cutout_width + 0.02, $tubing_ring_height + 0.01]);
            }
        }
        
        // Solid Bridge
        translate([8, 0, 0]) {
            cube([$bridge_width_x, $bridge_width_y, $bridge_height]);
        }
    }
    
    // 2. Cut out the Rod Hole (Inner Cylinder)
    // Extend slightly past the top and bottom faces to ensure clean cut
    translate([0, 0, -0.01]) 
        cylinder(h = $rod_ring_height + 0.02, d = $rod_diameter, center = true);
    
    // 3. Cut out the Tubing Hole (Inner Cylinder)
    // Extend slightly past the top and bottom faces to ensure clean cut
    translate([$tubing_center_x, $tubing_center_y, -0.01]) 
        cylinder(h = $tubing_ring_height + 0.02, d = $tubing_diameter, center = true);
}
